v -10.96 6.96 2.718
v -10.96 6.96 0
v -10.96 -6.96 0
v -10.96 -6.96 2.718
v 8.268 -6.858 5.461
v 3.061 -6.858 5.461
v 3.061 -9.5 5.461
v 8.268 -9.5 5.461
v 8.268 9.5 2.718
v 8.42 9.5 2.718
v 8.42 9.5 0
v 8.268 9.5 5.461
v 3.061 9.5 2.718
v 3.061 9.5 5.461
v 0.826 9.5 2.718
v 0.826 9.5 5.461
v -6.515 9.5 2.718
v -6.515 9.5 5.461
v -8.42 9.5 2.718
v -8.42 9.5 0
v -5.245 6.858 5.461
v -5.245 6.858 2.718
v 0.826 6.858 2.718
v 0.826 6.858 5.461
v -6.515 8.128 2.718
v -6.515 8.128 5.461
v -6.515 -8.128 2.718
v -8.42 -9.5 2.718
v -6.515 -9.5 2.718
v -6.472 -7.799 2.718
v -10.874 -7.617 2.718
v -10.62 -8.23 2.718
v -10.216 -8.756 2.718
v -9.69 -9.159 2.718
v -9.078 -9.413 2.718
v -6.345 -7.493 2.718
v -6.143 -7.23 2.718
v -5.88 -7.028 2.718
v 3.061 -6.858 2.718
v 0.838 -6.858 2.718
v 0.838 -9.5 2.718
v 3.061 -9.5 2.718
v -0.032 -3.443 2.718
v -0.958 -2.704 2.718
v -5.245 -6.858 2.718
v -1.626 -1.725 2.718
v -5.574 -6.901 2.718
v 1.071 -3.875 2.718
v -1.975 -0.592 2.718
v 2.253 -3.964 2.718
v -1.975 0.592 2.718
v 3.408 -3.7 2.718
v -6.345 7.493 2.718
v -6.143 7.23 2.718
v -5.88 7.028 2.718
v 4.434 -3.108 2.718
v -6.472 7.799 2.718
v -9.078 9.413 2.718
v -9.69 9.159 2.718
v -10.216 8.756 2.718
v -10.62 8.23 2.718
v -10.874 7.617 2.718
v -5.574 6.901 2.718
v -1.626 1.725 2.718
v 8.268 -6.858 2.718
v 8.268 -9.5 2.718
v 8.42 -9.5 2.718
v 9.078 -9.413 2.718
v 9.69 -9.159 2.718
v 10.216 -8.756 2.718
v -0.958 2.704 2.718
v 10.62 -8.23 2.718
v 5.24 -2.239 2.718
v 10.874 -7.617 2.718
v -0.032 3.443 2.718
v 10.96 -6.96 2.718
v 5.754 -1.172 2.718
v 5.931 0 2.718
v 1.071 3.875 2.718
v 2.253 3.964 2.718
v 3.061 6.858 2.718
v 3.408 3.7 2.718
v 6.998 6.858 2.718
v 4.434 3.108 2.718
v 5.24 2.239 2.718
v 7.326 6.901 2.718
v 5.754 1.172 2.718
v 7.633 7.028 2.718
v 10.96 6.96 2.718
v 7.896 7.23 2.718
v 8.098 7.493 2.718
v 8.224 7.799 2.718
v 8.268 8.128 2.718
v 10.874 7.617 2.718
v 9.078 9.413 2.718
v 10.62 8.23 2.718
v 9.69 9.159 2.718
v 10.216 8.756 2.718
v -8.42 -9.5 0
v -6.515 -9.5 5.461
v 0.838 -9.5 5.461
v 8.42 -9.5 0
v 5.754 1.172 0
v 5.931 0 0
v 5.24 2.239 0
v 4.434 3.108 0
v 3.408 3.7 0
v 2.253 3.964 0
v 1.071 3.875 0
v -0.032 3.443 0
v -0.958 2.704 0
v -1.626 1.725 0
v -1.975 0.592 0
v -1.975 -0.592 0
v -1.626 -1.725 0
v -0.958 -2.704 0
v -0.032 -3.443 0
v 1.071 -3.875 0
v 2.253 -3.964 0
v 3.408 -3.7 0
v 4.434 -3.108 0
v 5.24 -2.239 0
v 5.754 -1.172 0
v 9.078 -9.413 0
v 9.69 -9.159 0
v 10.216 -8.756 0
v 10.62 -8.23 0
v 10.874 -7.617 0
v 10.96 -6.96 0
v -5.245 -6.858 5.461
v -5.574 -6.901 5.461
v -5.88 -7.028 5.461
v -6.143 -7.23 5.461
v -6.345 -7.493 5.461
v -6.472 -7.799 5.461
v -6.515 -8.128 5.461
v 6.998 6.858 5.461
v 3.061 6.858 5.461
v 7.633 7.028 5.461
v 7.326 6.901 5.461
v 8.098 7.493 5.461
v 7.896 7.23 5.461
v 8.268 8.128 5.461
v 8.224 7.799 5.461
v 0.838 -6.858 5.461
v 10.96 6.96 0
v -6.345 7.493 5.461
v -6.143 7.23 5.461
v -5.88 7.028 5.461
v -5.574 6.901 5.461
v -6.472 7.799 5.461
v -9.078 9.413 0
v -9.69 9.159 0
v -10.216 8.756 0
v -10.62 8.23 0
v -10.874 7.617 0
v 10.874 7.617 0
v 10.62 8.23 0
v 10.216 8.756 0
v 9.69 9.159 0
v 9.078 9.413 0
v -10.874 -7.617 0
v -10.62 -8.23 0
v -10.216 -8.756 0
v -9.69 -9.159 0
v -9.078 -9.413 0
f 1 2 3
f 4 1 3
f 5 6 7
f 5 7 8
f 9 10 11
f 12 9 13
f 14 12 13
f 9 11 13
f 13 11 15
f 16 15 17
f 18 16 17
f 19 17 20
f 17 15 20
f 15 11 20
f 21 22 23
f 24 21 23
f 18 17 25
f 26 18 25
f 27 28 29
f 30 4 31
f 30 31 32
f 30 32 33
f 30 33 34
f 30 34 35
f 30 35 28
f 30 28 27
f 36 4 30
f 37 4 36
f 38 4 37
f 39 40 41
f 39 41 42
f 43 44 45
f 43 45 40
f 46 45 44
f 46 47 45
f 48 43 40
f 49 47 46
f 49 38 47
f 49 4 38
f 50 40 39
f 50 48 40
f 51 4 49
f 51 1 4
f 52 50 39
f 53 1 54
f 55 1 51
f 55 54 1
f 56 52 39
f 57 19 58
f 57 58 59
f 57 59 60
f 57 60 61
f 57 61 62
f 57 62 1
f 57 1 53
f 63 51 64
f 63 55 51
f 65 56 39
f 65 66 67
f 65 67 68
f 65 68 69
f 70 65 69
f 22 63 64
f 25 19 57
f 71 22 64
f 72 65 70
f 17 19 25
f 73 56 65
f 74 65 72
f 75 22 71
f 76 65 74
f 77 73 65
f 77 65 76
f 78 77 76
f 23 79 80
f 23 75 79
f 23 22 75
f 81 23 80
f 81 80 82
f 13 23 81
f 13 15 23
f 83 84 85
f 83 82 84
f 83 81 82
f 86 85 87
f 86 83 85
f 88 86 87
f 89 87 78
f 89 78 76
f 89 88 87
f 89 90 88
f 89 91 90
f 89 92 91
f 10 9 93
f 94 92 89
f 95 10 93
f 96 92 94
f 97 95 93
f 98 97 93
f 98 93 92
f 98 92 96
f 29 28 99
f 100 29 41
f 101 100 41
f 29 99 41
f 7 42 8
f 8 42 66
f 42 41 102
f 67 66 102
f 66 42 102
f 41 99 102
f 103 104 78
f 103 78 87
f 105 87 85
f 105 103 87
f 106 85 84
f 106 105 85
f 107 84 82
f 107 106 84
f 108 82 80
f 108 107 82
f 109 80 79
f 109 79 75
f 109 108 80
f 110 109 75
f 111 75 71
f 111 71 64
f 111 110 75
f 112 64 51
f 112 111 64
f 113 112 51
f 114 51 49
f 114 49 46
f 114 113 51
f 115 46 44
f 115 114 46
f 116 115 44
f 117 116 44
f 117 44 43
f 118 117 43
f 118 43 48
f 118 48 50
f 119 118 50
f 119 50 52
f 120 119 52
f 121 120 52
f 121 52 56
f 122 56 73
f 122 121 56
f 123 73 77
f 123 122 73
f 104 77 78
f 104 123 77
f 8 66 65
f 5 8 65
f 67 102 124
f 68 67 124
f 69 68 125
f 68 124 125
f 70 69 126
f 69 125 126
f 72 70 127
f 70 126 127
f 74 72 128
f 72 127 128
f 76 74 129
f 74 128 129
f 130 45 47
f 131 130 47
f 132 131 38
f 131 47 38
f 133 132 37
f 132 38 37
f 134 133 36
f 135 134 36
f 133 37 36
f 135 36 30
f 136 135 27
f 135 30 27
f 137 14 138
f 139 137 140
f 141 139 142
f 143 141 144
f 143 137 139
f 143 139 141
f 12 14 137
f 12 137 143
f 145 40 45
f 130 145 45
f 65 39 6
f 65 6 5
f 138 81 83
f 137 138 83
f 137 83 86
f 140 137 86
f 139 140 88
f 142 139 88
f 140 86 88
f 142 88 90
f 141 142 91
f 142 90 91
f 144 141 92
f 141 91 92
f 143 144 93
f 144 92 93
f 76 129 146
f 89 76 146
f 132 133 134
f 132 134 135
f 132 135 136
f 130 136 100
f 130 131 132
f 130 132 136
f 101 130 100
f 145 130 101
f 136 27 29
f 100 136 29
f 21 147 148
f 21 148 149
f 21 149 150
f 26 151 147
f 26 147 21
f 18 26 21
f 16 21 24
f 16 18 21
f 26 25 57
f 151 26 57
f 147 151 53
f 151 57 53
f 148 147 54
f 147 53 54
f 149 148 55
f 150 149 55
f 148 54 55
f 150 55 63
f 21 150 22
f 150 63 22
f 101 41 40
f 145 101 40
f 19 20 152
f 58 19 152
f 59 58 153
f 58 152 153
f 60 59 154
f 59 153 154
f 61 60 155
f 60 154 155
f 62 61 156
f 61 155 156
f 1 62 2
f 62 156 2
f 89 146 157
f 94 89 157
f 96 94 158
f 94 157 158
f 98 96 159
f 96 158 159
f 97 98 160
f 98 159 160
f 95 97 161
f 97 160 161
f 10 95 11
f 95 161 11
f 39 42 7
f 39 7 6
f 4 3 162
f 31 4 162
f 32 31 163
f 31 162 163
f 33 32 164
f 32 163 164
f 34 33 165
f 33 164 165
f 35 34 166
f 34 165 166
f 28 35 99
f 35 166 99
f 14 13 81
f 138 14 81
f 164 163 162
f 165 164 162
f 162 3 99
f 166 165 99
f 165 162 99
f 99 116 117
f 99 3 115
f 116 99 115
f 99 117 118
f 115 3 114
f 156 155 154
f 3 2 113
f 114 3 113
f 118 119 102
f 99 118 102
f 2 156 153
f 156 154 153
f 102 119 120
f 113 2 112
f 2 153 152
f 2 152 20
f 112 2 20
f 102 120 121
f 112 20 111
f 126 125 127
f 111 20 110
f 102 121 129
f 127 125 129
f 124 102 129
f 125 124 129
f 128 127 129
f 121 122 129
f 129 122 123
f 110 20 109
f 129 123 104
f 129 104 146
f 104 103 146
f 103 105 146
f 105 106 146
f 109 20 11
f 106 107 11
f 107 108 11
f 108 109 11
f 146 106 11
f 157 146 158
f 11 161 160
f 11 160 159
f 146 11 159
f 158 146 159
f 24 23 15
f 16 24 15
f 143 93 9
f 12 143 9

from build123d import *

# Parameters (mm, degrees)
F0_R     = 3.9751
F1_DEPTH = 2.7178
F2_W     = 5.207
F2_H     = 2.6416
F3_DEPTH = 2.7432


with BuildPart() as f1:
    # F0 (on Top) → F1 (new body)
    with BuildSketch(Plane.XY):
        with BuildLine():
            Line((8.4201, 9.4996), (-8.4201, 9.4996))
            ThreePointArc((-8.4201, 9.4996), (-10.216151, 8.755651), (-10.9601, 6.9596))
            Line((-10.9601, 6.9596), (-10.9601, -6.9596))
            ThreePointArc((-10.9601, -6.9596), (-10.216151, -8.755651), (-8.4201, -9.4996))
            Line((-8.4201, -9.4996), (8.4201, -9.4996))
            ThreePointArc((8.4201, -9.4996), (10.216151, -8.755651), (10.9601, -6.9596))
            Line((10.9601, -6.9596), (10.9601, 6.9596))
            ThreePointArc((10.9601, 6.9596), (10.216151, 8.755651), (8.4201, 9.4996))
        make_face()
        with Locations((1.9558, 0)):
            Circle(F0_R, mode=Mode.SUBTRACT)
    extrude(amount=F1_DEPTH)

    # F2 (on face) → F3 (join)
    with BuildSketch(Plane.XY.offset(2.7178)):
        with BuildLine():
            Line((0.8255, 9.4996), (-6.5151, 9.4996))
            Line((-6.5151, 9.4996), (-6.5151, 8.128))
            ThreePointArc((-6.5151, 8.128), (-6.143126, 7.229974), (-5.2451, 6.858))
            Line((-5.2451, 6.858), (0.8255, 6.858))
            Line((0.8255, 6.858), (0.8255, 9.4996))
        make_face()
        with BuildLine():
            Line((8.2677, 9.4996), (3.0607, 9.4996))
            Line((3.0607, 9.4996), (3.0607, 6.858))
            Line((3.0607, 6.858), (6.9977, 6.858))
            ThreePointArc((6.9977, 6.858), (7.895726, 7.229974), (8.2677, 8.128))
            Line((8.2677, 8.128), (8.2677, 9.4996))
        make_face()
        with BuildLine():
            Line((-6.5151, -8.128), (-6.5151, -9.4996))
            Line((-6.5151, -9.4996), (0.8382, -9.4996))
            Line((0.8382, -9.4996), (0.8382, -6.858))
            Line((0.8382, -6.858), (-5.2451, -6.858))
            ThreePointArc((-5.2451, -6.858), (-6.143126, -7.229974), (-6.5151, -8.128))
        make_face()
        with Locations((5.6642, -8.1788)):
            Rectangle(F2_W, F2_H)
    extrude(amount=F3_DEPTH)


solid = f1.part
